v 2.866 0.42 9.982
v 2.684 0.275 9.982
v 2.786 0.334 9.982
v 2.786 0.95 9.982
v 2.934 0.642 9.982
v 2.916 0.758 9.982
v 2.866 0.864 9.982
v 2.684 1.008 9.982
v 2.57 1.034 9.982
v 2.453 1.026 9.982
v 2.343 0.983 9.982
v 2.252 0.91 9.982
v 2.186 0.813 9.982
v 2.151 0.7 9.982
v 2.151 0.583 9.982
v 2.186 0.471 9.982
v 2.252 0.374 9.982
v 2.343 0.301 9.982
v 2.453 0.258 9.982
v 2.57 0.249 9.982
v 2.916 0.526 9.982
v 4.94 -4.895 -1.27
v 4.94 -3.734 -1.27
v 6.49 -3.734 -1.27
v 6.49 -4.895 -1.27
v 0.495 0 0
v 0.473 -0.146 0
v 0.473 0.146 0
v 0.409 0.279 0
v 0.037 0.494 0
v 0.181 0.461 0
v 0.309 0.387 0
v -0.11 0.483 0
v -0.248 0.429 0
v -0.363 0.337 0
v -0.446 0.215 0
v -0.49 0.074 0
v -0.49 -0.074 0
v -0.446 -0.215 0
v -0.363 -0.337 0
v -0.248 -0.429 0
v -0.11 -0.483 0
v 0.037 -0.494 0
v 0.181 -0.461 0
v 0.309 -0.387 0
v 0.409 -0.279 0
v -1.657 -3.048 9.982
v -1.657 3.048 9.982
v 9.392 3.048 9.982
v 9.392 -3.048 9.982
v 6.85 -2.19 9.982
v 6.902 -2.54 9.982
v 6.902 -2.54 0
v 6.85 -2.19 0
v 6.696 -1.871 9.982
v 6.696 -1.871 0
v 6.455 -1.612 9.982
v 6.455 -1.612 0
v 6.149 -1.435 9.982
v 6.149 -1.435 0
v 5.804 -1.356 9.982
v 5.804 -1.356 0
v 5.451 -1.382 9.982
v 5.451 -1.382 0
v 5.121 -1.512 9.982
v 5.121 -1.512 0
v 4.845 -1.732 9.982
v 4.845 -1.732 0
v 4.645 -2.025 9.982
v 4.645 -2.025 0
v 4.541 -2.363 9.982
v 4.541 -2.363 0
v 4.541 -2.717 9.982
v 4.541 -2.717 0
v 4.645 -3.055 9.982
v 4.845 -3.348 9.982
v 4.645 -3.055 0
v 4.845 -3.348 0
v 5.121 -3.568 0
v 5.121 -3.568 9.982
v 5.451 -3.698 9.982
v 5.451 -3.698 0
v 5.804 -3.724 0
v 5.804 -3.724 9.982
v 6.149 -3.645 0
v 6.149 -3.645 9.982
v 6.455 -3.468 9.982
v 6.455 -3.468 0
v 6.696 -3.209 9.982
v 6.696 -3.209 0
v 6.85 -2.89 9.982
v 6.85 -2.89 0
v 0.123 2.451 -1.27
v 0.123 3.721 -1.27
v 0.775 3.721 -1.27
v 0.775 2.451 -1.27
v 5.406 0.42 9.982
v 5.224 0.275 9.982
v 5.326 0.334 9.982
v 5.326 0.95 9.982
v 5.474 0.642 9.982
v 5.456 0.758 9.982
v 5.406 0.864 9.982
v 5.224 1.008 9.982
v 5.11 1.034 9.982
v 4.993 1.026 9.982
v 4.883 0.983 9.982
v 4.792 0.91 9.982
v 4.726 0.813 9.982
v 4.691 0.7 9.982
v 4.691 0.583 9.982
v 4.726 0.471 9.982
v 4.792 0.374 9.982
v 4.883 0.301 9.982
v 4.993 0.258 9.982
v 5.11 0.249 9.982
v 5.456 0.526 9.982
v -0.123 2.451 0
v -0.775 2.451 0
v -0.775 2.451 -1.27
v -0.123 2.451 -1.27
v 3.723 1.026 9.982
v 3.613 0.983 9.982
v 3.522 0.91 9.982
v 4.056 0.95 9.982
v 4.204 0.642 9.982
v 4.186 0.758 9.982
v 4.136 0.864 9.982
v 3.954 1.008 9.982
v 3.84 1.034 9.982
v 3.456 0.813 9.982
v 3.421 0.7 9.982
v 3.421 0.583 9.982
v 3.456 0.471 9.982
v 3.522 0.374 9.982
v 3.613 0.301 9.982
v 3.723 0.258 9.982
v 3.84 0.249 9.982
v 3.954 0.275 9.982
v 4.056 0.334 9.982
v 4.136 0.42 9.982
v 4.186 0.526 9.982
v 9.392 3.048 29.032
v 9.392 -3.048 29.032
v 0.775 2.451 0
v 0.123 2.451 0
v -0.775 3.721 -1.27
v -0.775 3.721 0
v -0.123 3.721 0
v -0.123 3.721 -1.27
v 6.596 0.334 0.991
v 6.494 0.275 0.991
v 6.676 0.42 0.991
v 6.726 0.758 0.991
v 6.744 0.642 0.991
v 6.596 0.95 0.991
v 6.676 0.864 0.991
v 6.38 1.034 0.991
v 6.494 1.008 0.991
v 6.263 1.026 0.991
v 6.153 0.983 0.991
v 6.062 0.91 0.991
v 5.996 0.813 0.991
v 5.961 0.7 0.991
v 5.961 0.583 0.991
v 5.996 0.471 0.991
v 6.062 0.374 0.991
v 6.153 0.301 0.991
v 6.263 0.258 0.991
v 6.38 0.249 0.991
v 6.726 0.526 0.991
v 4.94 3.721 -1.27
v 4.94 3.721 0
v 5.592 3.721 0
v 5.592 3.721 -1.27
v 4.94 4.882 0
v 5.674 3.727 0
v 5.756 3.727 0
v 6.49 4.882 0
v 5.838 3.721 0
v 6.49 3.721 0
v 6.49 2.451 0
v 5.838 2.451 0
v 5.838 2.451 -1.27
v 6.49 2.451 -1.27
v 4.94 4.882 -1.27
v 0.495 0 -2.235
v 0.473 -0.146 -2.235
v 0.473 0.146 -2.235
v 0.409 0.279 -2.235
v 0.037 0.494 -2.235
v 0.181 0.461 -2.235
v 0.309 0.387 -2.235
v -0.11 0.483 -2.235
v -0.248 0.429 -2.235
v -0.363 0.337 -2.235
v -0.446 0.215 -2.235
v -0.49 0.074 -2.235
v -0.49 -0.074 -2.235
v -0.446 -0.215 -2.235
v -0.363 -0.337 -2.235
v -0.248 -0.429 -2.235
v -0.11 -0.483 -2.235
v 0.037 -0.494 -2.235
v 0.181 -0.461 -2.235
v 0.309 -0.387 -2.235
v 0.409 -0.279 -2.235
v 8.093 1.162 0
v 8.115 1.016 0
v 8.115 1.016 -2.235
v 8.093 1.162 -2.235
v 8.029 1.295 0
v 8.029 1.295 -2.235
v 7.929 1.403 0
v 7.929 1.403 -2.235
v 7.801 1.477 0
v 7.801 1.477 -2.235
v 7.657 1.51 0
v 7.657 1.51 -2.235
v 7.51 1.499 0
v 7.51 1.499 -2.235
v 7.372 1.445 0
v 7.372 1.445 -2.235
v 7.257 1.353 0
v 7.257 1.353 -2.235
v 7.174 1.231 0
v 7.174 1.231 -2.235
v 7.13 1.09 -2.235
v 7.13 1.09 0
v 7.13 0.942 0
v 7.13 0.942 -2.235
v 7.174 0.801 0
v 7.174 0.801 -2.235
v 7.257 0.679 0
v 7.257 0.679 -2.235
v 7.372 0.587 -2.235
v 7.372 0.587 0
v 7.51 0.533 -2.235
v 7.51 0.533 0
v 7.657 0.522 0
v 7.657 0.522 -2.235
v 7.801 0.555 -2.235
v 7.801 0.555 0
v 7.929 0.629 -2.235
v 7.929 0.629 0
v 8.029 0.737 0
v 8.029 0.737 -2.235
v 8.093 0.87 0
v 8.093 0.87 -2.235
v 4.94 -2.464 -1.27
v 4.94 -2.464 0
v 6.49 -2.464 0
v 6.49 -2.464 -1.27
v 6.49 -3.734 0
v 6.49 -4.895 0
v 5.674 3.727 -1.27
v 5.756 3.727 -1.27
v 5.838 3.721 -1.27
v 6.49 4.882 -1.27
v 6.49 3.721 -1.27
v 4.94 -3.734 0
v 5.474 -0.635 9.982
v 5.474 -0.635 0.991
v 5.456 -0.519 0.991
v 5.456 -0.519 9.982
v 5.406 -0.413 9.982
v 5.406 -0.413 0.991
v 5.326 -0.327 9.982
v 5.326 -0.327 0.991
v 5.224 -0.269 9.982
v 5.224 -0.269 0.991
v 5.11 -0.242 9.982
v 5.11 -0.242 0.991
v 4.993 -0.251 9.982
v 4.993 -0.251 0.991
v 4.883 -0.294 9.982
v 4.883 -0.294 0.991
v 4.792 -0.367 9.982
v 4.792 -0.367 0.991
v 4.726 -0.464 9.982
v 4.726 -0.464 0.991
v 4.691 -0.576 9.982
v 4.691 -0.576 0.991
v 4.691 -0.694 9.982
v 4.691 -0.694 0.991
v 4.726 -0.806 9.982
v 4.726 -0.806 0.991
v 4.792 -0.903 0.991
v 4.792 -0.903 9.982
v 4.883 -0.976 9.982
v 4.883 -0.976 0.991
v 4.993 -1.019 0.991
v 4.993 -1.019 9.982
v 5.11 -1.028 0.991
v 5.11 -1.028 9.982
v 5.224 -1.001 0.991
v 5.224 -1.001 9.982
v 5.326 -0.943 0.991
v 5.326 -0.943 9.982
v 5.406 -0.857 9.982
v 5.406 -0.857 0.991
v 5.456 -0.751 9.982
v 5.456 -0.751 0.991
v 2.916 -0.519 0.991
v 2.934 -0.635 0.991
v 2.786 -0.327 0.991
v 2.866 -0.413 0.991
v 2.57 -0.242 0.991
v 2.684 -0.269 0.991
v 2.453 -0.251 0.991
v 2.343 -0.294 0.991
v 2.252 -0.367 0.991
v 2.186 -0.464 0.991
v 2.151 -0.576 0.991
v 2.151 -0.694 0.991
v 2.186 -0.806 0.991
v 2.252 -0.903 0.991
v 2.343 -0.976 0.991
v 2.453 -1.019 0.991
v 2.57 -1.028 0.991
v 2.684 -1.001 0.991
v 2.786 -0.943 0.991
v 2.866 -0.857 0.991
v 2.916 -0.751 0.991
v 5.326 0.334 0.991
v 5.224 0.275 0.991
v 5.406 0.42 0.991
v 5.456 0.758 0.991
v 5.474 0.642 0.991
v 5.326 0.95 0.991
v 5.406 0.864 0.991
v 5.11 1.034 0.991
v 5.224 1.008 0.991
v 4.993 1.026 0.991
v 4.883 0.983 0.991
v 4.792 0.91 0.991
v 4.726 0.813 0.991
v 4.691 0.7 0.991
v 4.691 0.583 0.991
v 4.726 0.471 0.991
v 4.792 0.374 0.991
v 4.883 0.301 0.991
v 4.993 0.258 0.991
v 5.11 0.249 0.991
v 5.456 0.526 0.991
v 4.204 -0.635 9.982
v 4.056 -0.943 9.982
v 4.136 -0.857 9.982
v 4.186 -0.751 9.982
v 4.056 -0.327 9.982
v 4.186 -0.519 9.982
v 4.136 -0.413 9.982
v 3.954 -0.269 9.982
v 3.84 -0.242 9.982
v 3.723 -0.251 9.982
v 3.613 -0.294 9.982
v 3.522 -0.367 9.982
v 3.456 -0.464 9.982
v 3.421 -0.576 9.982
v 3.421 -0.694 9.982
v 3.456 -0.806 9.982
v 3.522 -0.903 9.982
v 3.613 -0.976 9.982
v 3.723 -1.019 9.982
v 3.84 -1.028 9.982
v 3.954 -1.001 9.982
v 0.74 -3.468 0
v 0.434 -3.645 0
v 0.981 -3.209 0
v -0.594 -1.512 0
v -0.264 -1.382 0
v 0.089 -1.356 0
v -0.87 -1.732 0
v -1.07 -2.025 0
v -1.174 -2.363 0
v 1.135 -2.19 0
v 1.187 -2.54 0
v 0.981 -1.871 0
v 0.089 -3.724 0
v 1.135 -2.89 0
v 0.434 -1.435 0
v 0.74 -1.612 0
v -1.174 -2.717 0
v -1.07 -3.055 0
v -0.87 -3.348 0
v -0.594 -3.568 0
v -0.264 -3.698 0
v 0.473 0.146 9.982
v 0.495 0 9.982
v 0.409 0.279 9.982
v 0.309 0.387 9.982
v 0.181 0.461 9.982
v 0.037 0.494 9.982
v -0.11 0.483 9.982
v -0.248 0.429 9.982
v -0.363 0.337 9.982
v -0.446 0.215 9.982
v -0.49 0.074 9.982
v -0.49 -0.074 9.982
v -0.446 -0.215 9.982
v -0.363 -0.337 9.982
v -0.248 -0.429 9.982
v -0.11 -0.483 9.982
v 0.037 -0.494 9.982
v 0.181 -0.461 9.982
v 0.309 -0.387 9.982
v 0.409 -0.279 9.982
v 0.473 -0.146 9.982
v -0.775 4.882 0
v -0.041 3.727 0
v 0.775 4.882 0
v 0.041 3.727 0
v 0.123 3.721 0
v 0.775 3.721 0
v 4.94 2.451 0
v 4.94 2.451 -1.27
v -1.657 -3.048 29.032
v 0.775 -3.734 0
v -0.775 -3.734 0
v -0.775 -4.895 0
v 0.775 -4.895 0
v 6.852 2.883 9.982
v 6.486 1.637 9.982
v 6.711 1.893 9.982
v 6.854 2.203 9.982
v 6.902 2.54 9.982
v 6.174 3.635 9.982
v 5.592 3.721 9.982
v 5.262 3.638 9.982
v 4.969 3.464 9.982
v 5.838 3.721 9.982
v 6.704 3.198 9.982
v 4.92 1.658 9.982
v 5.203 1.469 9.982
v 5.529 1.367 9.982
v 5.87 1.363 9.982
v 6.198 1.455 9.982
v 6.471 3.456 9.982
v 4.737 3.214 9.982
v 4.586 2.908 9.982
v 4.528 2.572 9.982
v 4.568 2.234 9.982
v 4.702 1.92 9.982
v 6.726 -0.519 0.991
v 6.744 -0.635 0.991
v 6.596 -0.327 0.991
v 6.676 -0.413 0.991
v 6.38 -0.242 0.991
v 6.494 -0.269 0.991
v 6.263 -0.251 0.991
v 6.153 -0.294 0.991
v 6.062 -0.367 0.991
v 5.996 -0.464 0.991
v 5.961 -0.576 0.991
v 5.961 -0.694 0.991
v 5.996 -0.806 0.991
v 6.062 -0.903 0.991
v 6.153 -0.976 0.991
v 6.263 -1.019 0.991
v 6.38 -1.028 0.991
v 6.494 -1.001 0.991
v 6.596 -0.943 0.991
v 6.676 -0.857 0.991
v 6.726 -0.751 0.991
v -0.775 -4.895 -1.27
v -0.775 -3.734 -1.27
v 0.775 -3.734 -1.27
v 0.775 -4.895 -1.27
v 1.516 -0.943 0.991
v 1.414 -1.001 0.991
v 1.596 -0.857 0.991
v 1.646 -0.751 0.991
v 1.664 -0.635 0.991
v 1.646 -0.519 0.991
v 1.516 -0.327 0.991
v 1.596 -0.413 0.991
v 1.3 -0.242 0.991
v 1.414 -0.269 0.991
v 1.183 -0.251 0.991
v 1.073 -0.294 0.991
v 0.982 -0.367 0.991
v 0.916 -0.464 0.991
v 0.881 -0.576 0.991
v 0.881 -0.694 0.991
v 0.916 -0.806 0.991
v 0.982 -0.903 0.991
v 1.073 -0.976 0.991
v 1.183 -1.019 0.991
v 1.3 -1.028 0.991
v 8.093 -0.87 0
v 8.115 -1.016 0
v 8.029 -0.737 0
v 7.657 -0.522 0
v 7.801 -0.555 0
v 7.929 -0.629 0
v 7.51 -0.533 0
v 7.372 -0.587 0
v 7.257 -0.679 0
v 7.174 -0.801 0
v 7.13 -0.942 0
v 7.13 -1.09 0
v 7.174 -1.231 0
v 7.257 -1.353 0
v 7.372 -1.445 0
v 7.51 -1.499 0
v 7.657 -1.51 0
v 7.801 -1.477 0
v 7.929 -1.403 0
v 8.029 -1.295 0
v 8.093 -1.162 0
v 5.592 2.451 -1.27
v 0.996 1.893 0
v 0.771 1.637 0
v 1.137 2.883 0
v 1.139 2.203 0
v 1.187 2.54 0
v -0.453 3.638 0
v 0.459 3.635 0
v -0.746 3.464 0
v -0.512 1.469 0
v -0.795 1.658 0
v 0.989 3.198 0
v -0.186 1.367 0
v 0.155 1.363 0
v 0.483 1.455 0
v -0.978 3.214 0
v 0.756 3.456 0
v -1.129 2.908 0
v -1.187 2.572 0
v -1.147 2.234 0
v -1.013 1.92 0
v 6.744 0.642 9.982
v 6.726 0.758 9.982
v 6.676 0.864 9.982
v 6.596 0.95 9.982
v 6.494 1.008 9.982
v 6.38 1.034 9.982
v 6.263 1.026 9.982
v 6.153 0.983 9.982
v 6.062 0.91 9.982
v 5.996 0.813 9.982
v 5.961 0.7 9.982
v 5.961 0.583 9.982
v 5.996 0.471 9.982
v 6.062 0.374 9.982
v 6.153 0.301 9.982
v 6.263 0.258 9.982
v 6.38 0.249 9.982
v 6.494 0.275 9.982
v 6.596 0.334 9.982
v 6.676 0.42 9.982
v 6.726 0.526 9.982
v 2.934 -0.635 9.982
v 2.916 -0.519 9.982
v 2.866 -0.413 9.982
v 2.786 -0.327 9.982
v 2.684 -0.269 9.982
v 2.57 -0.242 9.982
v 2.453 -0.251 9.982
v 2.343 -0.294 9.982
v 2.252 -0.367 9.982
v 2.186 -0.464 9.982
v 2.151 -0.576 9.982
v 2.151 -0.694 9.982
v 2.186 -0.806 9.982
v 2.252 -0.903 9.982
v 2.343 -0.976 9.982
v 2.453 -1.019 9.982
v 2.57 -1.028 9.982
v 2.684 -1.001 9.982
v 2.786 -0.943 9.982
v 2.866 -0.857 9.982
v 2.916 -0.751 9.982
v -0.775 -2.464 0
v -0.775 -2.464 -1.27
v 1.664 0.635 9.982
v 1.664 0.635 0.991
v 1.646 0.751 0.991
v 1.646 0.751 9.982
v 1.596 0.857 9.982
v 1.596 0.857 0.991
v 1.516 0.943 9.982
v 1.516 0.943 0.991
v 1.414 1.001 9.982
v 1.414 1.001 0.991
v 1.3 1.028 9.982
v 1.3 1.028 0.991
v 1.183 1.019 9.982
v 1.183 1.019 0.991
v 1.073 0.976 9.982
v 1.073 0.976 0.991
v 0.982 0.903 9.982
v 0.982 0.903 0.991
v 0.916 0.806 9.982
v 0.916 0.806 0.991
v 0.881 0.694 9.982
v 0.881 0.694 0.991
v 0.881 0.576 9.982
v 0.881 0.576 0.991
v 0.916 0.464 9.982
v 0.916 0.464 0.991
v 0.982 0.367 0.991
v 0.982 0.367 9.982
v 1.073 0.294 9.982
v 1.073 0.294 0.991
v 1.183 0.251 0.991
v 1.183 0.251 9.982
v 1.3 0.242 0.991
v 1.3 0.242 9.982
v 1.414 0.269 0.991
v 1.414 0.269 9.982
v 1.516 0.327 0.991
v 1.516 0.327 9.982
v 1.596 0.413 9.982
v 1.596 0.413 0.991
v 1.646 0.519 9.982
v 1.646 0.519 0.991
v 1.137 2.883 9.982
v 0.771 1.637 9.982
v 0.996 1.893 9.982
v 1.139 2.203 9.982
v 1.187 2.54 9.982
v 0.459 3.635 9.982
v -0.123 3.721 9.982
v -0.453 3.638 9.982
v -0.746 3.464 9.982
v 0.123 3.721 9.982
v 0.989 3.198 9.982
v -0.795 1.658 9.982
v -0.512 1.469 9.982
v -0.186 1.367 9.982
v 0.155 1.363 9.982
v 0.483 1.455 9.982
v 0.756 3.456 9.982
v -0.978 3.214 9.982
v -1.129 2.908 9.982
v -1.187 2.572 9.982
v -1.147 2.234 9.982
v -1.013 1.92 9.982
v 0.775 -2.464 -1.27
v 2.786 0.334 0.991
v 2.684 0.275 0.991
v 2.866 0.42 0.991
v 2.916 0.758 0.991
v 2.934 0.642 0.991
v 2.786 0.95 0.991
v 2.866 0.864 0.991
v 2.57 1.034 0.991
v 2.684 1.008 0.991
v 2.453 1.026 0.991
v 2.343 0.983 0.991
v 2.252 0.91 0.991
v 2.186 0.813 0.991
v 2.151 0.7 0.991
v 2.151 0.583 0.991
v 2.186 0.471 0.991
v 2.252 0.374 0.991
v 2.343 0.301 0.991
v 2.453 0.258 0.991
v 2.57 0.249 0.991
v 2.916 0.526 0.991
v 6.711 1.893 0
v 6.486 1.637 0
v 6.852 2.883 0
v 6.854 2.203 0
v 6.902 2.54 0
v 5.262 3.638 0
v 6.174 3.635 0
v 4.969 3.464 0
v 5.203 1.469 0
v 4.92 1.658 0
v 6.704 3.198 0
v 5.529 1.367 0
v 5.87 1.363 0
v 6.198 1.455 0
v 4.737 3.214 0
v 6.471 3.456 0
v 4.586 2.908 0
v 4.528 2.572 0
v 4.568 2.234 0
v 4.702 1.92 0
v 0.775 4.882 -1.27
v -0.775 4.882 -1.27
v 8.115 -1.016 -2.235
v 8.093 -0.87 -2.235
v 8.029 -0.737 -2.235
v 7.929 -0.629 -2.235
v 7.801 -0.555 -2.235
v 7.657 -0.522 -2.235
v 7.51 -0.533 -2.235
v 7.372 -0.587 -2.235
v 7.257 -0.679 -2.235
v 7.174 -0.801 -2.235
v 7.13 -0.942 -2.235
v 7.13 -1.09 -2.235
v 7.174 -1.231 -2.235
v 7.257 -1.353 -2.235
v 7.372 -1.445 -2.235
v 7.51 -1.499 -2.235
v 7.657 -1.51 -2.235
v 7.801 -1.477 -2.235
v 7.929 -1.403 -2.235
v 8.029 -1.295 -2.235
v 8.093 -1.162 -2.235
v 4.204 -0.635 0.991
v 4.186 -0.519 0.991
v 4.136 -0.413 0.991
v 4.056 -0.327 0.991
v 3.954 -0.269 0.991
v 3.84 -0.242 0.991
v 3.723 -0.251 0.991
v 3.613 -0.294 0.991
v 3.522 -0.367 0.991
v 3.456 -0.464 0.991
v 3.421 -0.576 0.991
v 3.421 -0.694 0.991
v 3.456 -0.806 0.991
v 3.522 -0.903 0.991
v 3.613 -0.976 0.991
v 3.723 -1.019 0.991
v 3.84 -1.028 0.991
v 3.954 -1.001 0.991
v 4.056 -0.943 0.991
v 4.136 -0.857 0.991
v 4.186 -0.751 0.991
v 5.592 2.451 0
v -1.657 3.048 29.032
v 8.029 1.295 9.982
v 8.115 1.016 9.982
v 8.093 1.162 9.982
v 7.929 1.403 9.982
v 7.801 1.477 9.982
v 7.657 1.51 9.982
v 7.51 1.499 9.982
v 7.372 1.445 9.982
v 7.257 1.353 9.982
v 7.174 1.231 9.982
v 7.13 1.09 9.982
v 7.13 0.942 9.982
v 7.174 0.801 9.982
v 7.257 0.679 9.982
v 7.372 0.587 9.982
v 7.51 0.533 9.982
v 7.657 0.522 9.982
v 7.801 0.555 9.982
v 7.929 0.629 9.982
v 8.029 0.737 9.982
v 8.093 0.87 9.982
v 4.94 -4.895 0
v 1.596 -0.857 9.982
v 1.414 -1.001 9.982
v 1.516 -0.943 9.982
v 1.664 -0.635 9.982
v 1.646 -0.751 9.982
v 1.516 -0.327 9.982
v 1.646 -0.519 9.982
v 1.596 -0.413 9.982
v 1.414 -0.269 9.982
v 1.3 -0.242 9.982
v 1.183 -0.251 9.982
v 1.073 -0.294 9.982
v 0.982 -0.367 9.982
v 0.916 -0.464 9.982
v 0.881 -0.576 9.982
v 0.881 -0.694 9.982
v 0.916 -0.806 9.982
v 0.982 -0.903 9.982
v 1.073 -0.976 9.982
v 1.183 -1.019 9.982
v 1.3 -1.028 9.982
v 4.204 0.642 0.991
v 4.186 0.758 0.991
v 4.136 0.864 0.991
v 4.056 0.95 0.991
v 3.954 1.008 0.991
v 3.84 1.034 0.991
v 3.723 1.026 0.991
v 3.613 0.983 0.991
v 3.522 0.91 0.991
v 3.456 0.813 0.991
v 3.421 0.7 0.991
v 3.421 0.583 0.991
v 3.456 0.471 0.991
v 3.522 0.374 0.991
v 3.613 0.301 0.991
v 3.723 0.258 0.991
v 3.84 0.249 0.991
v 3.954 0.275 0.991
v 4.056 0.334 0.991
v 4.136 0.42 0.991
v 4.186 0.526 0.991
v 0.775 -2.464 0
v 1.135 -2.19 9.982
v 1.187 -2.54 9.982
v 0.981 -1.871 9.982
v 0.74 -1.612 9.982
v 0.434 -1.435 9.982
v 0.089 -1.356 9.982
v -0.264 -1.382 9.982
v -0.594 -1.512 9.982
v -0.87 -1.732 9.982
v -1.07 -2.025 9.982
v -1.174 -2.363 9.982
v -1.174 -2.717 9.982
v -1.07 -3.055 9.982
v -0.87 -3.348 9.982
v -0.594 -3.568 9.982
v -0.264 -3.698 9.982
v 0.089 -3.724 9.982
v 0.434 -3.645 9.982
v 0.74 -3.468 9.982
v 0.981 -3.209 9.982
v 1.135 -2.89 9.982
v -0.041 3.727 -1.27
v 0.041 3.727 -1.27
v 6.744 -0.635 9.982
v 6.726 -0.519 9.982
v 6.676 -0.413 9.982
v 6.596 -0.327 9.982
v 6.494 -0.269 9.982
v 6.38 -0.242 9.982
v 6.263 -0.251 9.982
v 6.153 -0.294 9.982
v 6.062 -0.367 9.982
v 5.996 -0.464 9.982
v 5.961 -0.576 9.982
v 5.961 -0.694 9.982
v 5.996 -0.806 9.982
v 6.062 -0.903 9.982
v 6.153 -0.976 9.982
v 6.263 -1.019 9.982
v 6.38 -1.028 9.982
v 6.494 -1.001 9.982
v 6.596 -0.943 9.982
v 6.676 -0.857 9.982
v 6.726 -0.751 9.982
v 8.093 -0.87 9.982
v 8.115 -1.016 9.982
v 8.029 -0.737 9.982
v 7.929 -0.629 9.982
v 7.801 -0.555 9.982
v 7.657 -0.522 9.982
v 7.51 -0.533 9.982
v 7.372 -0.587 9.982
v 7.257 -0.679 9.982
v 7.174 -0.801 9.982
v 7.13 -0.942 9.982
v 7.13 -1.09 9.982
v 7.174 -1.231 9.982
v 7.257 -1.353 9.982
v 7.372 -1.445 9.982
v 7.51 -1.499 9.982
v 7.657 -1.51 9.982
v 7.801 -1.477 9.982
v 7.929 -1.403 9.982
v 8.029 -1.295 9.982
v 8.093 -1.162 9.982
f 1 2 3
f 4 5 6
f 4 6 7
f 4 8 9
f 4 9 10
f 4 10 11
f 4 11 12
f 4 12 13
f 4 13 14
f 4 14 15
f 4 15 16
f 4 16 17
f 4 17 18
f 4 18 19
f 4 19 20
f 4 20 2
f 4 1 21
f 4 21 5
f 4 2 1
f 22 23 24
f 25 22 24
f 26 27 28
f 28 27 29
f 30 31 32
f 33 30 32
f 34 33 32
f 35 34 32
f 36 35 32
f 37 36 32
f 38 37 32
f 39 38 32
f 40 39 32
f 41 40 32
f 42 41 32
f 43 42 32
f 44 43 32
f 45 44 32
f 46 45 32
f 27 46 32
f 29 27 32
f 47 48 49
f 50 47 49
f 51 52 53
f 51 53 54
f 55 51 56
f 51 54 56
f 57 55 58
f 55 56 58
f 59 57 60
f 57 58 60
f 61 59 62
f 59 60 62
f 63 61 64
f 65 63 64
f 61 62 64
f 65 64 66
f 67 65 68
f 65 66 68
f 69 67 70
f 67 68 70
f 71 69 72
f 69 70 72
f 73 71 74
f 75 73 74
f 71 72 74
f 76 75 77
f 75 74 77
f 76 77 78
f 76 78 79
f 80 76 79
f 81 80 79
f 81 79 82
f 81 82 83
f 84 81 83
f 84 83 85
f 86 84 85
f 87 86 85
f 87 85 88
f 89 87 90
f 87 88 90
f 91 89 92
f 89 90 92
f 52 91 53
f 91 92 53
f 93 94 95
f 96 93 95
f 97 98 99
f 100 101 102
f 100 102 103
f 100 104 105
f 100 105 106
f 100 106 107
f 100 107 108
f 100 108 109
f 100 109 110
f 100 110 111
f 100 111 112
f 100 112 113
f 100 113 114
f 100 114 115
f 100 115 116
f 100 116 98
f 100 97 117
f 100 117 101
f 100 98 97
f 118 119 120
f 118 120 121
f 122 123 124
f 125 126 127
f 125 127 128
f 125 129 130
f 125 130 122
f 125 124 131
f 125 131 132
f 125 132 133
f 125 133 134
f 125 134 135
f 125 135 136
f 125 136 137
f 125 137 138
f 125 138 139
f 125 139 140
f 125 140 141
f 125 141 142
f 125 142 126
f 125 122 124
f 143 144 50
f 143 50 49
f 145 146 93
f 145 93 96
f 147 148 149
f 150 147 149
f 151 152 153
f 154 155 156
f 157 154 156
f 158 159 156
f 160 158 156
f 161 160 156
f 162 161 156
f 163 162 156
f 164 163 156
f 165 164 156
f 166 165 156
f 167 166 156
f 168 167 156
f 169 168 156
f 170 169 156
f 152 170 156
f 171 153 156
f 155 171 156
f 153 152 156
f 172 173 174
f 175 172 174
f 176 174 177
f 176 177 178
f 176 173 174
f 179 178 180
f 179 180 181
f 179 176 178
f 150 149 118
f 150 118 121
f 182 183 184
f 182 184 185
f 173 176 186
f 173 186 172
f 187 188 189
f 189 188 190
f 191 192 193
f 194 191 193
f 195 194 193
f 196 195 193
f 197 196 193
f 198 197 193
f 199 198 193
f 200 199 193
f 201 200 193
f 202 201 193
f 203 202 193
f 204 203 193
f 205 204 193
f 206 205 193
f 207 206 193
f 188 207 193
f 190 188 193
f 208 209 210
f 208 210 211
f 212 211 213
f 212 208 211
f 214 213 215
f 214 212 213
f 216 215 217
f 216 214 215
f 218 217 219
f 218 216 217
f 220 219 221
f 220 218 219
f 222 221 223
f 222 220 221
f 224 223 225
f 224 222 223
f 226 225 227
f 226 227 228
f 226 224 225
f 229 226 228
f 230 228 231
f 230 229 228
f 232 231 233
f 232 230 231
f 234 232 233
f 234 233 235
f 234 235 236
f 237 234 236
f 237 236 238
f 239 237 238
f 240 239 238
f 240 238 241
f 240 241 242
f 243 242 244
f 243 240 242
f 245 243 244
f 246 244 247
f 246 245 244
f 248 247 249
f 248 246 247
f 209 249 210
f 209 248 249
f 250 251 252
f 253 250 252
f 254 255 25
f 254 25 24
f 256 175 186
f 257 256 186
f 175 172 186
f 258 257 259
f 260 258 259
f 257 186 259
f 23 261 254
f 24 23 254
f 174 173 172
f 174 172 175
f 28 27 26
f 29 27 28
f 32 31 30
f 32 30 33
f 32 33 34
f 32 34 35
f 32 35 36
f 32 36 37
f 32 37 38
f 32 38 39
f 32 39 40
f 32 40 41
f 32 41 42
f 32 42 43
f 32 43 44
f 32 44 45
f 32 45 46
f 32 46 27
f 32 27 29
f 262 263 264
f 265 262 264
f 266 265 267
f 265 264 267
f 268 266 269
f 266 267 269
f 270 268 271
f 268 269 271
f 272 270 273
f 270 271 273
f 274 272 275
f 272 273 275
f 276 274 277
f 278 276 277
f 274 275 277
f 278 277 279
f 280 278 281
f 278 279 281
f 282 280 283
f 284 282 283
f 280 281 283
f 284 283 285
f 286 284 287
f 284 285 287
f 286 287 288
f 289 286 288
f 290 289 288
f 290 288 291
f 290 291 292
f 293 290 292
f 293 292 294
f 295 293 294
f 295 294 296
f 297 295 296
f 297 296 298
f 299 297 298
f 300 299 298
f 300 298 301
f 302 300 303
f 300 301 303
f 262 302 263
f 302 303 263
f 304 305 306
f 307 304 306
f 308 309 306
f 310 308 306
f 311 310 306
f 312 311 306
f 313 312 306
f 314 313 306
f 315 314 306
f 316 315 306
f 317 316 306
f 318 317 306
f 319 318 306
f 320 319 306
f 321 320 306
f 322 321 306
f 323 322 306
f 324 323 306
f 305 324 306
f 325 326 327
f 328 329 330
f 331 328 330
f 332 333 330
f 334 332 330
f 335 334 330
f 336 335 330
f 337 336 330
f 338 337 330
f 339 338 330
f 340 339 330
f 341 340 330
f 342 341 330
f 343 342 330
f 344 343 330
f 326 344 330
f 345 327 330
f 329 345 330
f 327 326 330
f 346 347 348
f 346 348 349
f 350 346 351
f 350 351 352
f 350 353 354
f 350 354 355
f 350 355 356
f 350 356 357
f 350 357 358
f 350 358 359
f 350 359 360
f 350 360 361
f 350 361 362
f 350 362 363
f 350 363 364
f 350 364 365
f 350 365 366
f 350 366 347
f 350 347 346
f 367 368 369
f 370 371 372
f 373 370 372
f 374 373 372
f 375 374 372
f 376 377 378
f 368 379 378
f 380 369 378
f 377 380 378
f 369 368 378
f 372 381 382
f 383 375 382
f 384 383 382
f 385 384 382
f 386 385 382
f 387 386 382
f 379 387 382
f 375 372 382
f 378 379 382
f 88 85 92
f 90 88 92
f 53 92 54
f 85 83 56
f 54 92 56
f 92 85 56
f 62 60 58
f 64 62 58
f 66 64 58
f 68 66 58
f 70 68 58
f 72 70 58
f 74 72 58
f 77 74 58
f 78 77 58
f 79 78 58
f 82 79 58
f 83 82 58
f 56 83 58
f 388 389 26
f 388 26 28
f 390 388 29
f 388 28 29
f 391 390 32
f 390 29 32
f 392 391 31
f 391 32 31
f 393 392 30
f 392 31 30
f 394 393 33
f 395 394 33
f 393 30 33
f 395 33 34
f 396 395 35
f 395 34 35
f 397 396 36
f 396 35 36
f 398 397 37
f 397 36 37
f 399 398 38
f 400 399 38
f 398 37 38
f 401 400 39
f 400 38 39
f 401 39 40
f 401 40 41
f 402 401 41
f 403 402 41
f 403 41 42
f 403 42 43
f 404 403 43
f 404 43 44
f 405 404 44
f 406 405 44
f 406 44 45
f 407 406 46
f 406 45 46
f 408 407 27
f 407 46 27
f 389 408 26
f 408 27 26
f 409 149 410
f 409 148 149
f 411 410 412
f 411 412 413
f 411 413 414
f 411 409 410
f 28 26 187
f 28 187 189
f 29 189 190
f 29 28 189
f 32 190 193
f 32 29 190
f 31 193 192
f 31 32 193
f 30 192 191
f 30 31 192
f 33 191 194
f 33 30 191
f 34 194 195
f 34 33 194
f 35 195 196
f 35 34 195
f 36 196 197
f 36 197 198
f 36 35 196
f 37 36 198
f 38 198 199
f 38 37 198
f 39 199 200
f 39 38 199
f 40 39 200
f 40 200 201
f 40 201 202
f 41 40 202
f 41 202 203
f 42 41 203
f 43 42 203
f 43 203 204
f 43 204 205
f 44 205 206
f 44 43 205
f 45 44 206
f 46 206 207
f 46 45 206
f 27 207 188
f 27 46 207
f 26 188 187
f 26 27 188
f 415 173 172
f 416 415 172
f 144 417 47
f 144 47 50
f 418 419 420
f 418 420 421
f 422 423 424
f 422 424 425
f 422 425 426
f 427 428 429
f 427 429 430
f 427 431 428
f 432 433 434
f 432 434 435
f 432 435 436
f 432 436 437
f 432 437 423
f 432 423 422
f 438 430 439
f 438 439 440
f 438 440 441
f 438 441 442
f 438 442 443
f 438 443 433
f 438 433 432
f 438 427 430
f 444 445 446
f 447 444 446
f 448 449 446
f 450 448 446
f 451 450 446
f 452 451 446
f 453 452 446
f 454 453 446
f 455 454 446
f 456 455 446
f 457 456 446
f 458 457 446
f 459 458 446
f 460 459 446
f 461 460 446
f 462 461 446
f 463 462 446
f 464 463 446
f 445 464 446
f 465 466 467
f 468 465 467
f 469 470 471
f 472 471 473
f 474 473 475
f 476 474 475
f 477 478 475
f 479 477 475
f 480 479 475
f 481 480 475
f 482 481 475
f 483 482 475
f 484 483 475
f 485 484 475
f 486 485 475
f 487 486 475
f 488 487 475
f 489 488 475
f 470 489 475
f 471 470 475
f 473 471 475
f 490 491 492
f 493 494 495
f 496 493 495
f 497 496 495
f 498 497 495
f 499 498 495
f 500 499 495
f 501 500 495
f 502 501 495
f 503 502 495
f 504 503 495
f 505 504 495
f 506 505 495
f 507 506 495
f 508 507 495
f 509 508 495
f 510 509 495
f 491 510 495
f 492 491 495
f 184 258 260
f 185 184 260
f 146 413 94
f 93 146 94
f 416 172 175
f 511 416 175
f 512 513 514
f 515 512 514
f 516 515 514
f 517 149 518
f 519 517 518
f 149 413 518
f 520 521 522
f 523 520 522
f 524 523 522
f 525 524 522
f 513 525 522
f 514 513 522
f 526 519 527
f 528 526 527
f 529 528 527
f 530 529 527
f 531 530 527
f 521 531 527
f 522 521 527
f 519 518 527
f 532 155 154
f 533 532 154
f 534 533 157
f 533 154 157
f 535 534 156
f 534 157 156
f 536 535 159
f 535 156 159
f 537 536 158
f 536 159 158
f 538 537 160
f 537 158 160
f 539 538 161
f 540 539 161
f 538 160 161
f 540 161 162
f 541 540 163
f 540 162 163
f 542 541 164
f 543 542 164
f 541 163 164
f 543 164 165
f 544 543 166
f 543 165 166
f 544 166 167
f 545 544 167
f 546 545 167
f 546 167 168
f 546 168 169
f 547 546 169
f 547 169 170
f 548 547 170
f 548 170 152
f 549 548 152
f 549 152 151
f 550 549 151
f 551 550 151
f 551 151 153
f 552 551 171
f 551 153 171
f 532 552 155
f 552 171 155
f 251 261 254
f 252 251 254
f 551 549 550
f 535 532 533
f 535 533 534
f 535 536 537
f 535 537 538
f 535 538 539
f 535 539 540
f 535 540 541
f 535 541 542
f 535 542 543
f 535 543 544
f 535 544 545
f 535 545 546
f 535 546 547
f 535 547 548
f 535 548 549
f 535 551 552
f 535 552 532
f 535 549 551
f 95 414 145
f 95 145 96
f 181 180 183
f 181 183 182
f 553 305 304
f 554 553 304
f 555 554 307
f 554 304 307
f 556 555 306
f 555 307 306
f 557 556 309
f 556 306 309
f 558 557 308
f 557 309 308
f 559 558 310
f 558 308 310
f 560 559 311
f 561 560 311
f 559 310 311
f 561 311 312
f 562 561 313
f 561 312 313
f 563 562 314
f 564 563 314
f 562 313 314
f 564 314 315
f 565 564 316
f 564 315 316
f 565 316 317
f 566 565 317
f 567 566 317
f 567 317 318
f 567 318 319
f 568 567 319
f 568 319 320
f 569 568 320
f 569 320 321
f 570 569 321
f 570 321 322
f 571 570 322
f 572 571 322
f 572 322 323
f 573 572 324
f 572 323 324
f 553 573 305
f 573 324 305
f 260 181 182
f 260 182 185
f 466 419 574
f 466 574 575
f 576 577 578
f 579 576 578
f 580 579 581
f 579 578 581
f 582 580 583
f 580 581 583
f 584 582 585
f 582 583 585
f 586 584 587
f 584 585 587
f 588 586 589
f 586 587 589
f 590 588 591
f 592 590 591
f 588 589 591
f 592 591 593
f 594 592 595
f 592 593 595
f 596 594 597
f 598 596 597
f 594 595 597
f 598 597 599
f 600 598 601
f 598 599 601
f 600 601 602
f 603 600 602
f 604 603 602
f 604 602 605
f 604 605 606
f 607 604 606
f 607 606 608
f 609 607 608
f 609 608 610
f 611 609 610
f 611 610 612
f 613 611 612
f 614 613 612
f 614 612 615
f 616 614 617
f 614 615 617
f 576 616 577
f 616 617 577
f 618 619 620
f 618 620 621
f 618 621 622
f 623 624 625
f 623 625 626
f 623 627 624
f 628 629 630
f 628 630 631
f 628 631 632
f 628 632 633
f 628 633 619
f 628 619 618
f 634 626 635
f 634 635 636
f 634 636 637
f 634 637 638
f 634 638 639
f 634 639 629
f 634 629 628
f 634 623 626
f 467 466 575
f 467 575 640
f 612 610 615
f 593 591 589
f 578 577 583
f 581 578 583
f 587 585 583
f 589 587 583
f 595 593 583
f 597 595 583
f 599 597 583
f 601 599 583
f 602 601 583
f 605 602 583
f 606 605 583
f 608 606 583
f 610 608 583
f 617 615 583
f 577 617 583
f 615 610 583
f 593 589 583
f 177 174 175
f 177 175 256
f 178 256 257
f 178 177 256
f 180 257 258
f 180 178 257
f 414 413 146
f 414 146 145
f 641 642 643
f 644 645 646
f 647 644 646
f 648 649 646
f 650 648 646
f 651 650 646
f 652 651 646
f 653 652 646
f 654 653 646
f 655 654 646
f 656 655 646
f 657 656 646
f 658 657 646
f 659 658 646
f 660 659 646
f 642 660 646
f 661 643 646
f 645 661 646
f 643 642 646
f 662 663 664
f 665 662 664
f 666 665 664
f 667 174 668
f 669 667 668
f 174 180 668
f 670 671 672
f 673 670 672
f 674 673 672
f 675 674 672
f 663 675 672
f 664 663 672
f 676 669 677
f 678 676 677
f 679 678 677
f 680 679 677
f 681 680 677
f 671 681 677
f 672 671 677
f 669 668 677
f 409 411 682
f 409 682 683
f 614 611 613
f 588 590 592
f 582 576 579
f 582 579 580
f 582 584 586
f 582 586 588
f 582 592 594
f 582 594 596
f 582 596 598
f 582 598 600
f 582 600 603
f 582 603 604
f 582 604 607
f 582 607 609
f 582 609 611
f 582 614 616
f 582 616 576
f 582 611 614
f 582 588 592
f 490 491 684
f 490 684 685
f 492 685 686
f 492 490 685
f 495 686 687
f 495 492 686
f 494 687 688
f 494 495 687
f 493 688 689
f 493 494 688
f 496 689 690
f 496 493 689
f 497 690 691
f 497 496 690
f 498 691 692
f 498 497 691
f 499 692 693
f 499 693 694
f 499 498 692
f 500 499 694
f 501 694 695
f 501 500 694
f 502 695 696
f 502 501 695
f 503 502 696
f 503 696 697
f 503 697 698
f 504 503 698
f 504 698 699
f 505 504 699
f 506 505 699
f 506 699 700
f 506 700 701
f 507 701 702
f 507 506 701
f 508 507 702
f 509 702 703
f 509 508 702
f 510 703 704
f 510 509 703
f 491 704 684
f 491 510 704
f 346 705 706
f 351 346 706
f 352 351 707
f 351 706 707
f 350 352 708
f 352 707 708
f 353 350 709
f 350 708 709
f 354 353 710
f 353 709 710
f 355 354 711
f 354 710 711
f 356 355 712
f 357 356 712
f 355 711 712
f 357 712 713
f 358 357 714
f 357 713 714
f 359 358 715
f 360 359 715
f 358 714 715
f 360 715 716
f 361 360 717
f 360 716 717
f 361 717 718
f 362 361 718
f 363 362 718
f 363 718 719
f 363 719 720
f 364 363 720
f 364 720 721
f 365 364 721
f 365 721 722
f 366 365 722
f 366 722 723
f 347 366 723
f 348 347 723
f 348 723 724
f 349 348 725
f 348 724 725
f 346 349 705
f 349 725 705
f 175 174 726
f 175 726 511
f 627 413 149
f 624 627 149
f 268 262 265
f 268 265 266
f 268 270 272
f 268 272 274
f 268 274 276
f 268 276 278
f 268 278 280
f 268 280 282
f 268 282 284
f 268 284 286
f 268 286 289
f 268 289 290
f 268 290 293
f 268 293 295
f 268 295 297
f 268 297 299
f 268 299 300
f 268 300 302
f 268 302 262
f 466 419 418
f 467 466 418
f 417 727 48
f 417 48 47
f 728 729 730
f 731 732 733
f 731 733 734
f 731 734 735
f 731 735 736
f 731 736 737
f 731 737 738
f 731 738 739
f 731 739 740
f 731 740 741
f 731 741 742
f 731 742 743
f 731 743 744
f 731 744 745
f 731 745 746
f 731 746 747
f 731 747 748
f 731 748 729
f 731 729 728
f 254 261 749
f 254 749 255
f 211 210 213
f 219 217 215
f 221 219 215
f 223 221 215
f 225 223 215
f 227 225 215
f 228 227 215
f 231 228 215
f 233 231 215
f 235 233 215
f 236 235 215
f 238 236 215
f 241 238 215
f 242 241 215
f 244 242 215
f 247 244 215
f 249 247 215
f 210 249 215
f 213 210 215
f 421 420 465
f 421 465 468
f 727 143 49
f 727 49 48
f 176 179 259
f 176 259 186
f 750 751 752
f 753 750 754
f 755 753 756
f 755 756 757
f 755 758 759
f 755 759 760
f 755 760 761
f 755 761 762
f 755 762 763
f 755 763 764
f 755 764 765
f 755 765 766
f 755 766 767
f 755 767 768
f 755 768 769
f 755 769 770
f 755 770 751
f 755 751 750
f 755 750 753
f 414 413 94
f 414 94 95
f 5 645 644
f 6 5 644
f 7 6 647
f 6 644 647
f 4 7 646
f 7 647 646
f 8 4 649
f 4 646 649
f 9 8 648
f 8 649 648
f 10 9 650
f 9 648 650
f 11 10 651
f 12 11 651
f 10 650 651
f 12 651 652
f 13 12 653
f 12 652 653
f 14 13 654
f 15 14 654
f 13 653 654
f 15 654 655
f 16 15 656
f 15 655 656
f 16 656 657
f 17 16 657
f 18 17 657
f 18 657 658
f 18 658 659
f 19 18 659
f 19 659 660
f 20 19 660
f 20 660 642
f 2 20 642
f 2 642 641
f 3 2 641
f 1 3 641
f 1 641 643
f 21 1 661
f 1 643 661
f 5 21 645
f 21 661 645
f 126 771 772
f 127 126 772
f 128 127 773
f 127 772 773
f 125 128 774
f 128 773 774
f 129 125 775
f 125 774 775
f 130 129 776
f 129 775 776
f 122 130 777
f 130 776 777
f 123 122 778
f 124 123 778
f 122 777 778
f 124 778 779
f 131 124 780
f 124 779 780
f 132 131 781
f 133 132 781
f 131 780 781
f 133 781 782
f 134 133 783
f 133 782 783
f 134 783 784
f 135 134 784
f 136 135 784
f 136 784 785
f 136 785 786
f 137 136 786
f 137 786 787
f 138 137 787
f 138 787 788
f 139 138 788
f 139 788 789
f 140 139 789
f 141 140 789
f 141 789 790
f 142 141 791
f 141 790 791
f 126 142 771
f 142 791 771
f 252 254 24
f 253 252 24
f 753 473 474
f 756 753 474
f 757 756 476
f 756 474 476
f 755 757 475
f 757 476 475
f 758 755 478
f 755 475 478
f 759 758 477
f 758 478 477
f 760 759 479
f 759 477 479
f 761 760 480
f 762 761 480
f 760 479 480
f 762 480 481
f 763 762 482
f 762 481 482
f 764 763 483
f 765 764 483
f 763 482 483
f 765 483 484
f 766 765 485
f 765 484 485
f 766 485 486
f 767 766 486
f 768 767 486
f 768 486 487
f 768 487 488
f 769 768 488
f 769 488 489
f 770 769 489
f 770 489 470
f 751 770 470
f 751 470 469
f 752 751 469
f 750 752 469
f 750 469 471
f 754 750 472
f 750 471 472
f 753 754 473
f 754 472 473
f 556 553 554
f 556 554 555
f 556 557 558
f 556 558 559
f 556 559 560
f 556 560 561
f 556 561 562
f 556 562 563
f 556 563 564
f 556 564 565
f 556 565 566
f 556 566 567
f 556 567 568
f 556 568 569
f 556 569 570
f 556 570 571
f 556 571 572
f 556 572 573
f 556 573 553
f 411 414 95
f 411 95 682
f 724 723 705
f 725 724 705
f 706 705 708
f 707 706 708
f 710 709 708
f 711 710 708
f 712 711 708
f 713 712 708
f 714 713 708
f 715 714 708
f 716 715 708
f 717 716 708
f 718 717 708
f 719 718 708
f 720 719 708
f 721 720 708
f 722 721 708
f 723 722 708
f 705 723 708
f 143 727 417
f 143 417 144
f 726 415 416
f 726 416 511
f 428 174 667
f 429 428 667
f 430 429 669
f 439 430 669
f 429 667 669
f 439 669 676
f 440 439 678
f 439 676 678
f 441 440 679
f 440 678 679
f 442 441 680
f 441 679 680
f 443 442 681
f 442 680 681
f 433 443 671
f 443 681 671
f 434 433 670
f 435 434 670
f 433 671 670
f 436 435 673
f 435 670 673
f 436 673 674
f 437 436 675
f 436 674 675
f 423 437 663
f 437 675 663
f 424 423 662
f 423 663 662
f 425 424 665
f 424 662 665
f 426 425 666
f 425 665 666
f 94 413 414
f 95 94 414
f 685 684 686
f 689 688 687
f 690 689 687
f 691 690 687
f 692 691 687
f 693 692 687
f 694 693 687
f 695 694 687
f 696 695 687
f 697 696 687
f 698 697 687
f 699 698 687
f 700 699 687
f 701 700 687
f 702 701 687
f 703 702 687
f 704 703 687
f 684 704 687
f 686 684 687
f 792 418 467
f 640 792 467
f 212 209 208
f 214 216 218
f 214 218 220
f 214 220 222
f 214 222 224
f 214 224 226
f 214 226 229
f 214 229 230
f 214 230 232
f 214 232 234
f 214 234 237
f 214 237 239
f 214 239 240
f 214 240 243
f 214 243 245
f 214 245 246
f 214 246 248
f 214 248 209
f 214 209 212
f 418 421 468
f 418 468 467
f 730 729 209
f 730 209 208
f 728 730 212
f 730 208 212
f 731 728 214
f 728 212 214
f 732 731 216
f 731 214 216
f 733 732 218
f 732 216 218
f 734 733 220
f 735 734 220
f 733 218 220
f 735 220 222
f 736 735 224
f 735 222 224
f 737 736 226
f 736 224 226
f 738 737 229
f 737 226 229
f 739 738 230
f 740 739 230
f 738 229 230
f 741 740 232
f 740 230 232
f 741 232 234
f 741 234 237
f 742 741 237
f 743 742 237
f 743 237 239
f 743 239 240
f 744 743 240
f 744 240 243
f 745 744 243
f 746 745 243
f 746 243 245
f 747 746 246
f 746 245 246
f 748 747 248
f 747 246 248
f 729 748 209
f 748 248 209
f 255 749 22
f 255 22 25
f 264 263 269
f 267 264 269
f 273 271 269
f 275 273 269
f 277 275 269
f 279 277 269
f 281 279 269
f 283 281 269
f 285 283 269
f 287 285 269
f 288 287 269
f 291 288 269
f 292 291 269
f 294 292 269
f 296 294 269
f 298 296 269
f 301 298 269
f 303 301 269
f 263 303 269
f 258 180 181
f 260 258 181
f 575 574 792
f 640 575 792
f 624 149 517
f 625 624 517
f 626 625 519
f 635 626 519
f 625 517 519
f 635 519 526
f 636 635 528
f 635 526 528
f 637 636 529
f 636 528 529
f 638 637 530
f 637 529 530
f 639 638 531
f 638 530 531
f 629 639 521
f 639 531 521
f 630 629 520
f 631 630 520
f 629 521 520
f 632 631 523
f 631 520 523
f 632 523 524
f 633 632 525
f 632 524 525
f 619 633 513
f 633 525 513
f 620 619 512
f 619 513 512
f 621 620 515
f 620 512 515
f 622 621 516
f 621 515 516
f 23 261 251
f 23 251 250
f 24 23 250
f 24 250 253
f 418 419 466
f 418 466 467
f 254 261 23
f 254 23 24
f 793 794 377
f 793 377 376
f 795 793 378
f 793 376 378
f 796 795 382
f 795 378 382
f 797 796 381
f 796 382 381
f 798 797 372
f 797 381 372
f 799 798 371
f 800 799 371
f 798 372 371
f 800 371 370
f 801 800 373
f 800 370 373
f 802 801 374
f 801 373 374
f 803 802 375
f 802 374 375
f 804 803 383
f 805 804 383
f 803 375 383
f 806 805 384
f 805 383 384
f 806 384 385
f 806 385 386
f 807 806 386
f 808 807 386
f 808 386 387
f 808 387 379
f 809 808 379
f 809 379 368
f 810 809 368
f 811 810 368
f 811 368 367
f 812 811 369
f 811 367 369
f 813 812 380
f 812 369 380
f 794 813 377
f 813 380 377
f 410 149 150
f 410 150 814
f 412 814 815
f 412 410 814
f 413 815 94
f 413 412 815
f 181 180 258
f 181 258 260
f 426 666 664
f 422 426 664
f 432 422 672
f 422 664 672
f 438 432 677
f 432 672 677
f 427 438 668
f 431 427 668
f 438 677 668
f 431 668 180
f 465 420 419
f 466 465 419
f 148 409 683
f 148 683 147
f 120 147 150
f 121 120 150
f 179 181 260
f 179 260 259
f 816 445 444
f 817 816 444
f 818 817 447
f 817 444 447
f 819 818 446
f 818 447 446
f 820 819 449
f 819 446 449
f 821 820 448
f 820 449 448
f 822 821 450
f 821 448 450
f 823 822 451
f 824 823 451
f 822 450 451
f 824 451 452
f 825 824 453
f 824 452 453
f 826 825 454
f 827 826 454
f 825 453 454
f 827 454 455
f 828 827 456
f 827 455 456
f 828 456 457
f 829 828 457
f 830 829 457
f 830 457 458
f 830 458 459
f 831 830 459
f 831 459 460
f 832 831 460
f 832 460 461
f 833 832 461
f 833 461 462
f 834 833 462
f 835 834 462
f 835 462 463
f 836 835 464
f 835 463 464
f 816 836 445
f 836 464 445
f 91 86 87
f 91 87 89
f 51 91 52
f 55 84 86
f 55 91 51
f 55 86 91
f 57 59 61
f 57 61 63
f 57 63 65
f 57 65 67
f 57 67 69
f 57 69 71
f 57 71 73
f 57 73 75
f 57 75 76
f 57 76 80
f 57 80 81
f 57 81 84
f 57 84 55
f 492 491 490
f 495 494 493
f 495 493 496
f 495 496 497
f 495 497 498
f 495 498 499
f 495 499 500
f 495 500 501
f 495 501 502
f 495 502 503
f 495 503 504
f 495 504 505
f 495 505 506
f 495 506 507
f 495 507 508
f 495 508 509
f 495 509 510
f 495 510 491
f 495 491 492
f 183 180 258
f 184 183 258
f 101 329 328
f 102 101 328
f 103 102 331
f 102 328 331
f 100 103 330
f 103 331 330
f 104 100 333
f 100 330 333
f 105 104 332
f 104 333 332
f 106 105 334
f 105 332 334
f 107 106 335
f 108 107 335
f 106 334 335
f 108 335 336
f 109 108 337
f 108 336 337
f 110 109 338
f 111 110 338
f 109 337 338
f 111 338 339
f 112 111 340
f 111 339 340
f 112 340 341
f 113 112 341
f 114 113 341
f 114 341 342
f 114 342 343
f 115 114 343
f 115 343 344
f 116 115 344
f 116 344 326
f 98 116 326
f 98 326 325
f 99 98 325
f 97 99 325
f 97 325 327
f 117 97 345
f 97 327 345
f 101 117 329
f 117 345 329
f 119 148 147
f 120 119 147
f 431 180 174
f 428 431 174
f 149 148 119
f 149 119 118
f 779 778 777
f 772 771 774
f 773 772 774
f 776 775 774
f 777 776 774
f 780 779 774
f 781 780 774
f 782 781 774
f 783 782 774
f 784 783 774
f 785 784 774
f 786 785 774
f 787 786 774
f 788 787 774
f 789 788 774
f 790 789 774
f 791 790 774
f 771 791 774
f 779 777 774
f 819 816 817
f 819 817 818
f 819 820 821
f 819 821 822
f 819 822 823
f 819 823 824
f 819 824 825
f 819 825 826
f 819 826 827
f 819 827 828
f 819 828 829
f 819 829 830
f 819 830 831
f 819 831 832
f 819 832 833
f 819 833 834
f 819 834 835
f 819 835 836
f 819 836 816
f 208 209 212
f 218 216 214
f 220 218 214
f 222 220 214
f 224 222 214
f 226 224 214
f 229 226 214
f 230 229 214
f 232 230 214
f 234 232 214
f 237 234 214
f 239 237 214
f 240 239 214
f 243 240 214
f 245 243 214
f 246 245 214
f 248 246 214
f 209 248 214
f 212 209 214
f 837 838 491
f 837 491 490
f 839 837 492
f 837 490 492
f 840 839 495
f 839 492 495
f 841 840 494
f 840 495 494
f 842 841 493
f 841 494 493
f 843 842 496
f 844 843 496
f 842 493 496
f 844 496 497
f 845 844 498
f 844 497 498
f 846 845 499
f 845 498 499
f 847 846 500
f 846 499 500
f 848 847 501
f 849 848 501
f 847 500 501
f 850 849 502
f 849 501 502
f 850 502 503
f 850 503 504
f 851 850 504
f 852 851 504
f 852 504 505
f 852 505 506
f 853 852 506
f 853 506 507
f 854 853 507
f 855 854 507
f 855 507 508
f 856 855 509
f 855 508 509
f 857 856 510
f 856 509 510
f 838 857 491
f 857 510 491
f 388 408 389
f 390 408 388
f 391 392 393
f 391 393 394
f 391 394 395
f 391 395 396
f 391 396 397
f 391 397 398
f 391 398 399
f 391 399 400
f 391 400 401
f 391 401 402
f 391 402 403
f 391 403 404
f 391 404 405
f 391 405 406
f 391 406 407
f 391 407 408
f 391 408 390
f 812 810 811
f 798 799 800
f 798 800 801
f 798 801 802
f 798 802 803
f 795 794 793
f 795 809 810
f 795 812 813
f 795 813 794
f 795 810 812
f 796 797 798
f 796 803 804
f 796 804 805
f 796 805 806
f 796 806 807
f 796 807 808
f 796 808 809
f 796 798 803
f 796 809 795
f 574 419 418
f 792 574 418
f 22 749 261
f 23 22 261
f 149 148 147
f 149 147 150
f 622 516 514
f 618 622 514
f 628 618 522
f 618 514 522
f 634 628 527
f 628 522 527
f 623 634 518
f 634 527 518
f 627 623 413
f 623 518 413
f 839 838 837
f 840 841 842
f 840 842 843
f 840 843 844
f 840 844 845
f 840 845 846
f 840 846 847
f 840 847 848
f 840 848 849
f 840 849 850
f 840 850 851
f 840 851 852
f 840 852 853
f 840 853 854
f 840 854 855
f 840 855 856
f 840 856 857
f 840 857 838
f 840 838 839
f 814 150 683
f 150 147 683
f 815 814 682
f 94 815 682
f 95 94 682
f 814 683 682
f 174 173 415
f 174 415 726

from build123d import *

# Parameters (mm, degrees)
F1_DEPTH = 1.27
F0_W     = 1.5494
F0_H     = 1.161047956
F0_R     = 0.4953
F2_DEPTH = 2.2352
F0_R_2   = 1.18745
F3_DEPTH = 9.9822
F4_DEPTH = 1.27
F5_DEPTH = 1.27
F6_START = 0.9906
F0_R_3   = 0.3937
F6_DEPTH = 8.9916
F8_DEPTH = 19.05
F9_DEPTH = 9.9822


with BuildPart() as f1:
    # F0 (on Top) → F1 (new body)
    with BuildSketch(Plane.XY):
        with BuildLine():
            ThreePointArc((-0.1226388703, 3.7211), (0, 3.72745), (0.1226388703, 3.7211))
            Line((0.1226388703, 3.7211), (0.7747, 3.7211))
            Line((0.7747, 3.7211), (0.7747, 4.882147956))
            Line((0.7747, 4.882147956), (-0.7747, 4.882147956))
            Line((-0.7747, 4.882147956), (-0.7747, 3.7211))
            Line((-0.7747, 3.7211), (-0.1226388703, 3.7211))
        make_face()
    extrude(amount=-F1_DEPTH)


with BuildPart() as f1b:
    # F0 (on Top) → F1, piece 2 (new body)
    with BuildSketch(Plane.XY):
        with BuildLine():
            ThreePointArc((5.5923611297, 3.7211), (5.715, 3.72745), (5.8376388703, 3.7211))
            Line((5.8376388703, 3.7211), (6.4897, 3.7211))
            Line((6.4897, 3.7211), (6.4897, 4.882147956))
            Line((6.4897, 4.882147956), (4.9403, 4.882147956))
            Line((4.9403, 4.882147956), (4.9403, 3.7211))
            Line((4.9403, 3.7211), (5.5923611297, 3.7211))
        make_face()
    extrude(amount=-F1_DEPTH)


with BuildPart() as f1c:
    # F0 (on Top) → F1, piece 3 (new body)
    with BuildSketch(Plane.XY):
        with Locations((0, -4.3142373906)):
            Rectangle(F0_W, F0_H)
    extrude(amount=-F1_DEPTH)


with BuildPart() as f1d:
    # F0 (on Top) → F1, piece 4 (new body)
    with BuildSketch(Plane.XY):
        with Locations((5.715, -4.3142373906)):
            Rectangle(F0_W, F0_H)
    extrude(amount=-F1_DEPTH)


with BuildPart() as f2:
    # F0 (on Top) → F2 (new body)
    with BuildSketch(Plane.XY):
        with Locations((7.62, -1.016)):
            Circle(F0_R)
    extrude(amount=-F2_DEPTH)


with BuildPart() as f2b:
    # F0 (on Top) → F2, piece 2 (new body)
    with BuildSketch(Plane.XY):
        with Locations((7.62, 1.016)):
            Circle(F0_R)
    extrude(amount=-F2_DEPTH)


with BuildPart() as f2c:
    # F0 (on Top) → F2, piece 3 (new body)
    with BuildSketch(Plane.XY):
        Circle(F0_R)
    extrude(amount=-F2_DEPTH)


with BuildPart() as f3:
    # F0 (on Top) → F3 (new body)
    with BuildSketch(Plane.XY):
        with Locations((0, -2.54)):
            Circle(F0_R_2)
        with Locations((5.715, -2.54)):
            Circle(F0_R_2)
        with BuildLine():
            ThreePointArc((5.5923611297, 3.7211), (4.9198868081, 1.6580518641), (6.90245, 2.54))
            ThreePointArc((6.90245, 2.54), (6.5969481359, 3.3351131919), (5.8376388703, 3.7211))
            Line((5.8376388703, 3.7211), (5.5923611297, 3.7211))
        make_face()
        with BuildLine():
            ThreePointArc((-0.1226388703, 3.7211), (-0.7951131919, 1.6580518641), (1.18745, 2.54))
            ThreePointArc((1.18745, 2.54), (0.8819481359, 3.3351131919), (0.1226388703, 3.7211))
            Line((0.1226388703, 3.7211), (-0.1226388703, 3.7211))
        make_face()
    extrude(amount=F3_DEPTH)


with BuildPart() as f4:
    # F4 (new): a face of the model
    f4_faces = [f1.part.faces().sort_by_distance(p)[0] for p in [
        (0.4486694351, 3.7211, -0.635),
    ]]
    extrude(f4_faces, amount=F4_DEPTH)


with BuildPart() as f4b:
    # F4#2 (new): a face of the model
    f4_2_faces = [f1.part.faces().sort_by_distance(p)[0] for p in [
        (-0.4486694351, 3.7211, -0.635),
    ]]
    extrude(f4_2_faces, amount=F4_DEPTH)


with BuildPart() as f4c:
    # F4#3 (new): a face of the model
    f4_3_faces = [f1b.part.faces().sort_by_distance(p)[0] for p in [
        (5.2663305649, 3.7211, -0.635),
    ]]
    extrude(f4_3_faces, amount=F4_DEPTH)


with BuildPart() as f4d:
    # F4#4 (new): a face of the model
    f4_4_faces = [f1b.part.faces().sort_by_distance(p)[0] for p in [
        (6.1636694351, 3.7211, -0.635),
    ]]
    extrude(f4_4_faces, amount=F4_DEPTH)


with BuildPart() as f5:
    # F5 (new): a face of the model
    f5_faces = [f1c.part.faces().sort_by_distance(p)[0] for p in [
        (0, -3.7337134127, -0.635),
    ]]
    extrude(f5_faces, amount=F5_DEPTH)


with BuildPart() as f5b:
    # F5#2 (new): a face of the model
    f5_2_faces = [f1d.part.faces().sort_by_distance(p)[0] for p in [
        (5.715, -3.7337134127, -0.635),
    ]]
    extrude(f5_2_faces, amount=F5_DEPTH)


with BuildPart() as f6:
    # F0 (on Top) → F6 (new body)
    with BuildSketch(Plane.XY.offset(F6_START)):
        with Locations((3.8102645494, -0.635)):
            Circle(F0_R_3)
    extrude(amount=F6_DEPTH)


with BuildPart() as f6b:
    # F0 (on Top) → F6, piece 2 (new body)
    with BuildSketch(Plane.XY.offset(F6_START)):
        with Locations((3.8102645494, 0.6417604301)):
            Circle(F0_R_3)
    extrude(amount=F6_DEPTH)


with BuildPart() as f6c:
    # F0 (on Top) → F6, piece 3 (new body)
    with BuildSketch(Plane.XY.offset(F6_START)):
        with Locations((2.5402645494, 0.6417604301)):
            Circle(F0_R_3)
    extrude(amount=F6_DEPTH)


with BuildPart() as f6d:
    # F0 (on Top) → F6, piece 4 (new body)
    with BuildSketch(Plane.XY.offset(F6_START)):
        with Locations((2.5402645494, -0.635)):
            Circle(F0_R_3)
    extrude(amount=F6_DEPTH)


with BuildPart() as f6e:
    # F0 (on Top) → F6, piece 5 (new body)
    with BuildSketch(Plane.XY.offset(F6_START)):
        with Locations((1.2702645494, -0.635)):
            Circle(F0_R_3)
    extrude(amount=F6_DEPTH)


with BuildPart() as f6f:
    # F0 (on Top) → F6, piece 6 (new body)
    with BuildSketch(Plane.XY.offset(F6_START)):
        with Locations((1.2702645494, 0.635)):
            Circle(F0_R_3)
    extrude(amount=F6_DEPTH)


with BuildPart() as f6g:
    # F0 (on Top) → F6, piece 7 (new body)
    with BuildSketch(Plane.XY.offset(F6_START)):
        with Locations((5.0802645494, -0.635)):
            Circle(F0_R_3)
    extrude(amount=F6_DEPTH)


with BuildPart() as f6h:
    # F0 (on Top) → F6, piece 8 (new body)
    with BuildSketch(Plane.XY.offset(F6_START)):
        with Locations((5.0802645494, 0.6417604301)):
            Circle(F0_R_3)
    extrude(amount=F6_DEPTH)


with BuildPart() as f6i:
    # F0 (on Top) → F6, piece 9 (new body)
    with BuildSketch(Plane.XY.offset(F6_START)):
        with Locations((6.3502645494, 0.6417604301)):
            Circle(F0_R_3)
    extrude(amount=F6_DEPTH)


with BuildPart() as f6j:
    # F0 (on Top) → F6, piece 10 (new body)
    with BuildSketch(Plane.XY.offset(F6_START)):
        with Locations((6.3502645494, -0.635)):
            Circle(F0_R_3)
    extrude(amount=F6_DEPTH)


with BuildPart() as f8:
    # F7 (on face) → F8 (new body)
    with BuildSketch(Plane.XY.offset(9.9822)):
        with BuildLine():
            Line((9.39165, -3.048), (9.39165, 3.048))
            Line((9.39165, 3.048), (1.0733002853, 3.048))
            ThreePointArc((1.0733002853, 3.048), (0, 1.35255), (-1.0733002853, 3.048))
            Line((-1.0733002853, 3.048), (-1.65735, 3.048))
            Line((-1.65735, 3.048), (-1.65735, -3.048))
            Line((-1.65735, -3.048), (9.39165, -3.048))
        make_face()
        with BuildLine():
            ThreePointArc((-1.0733002853, 3.048), (0, 1.35255), (1.0733002853, 3.048))
            Line((1.0733002853, 3.048), (-1.0733002853, 3.048))
        make_face()
    extrude(amount=F8_DEPTH)


with BuildPart() as f9:
    # F0 (on Top) → F9 (new body)
    with BuildSketch(Plane.XY):
        with Locations((7.62, 1.016)):
            Circle(F0_R)
    extrude(amount=F9_DEPTH)


with BuildPart() as f9b:
    # F0 (on Top) → F9, piece 2 (new body)
    with BuildSketch(Plane.XY):
        with Locations((7.62, -1.016)):
            Circle(F0_R)
    extrude(amount=F9_DEPTH)


with BuildPart() as f9c:
    # F0 (on Top) → F9, piece 3 (new body)
    with BuildSketch(Plane.XY):
        Circle(F0_R)
    extrude(amount=F9_DEPTH)


solid = Compound([f1.part, f1b.part, f1c.part, f1d.part, f2.part, f2b.part, f2c.part, f3.part, f4.part, f4b.part, f4c.part, f4d.part, f5.part, f5b.part, f6.part, f6b.part, f6c.part, f6d.part, f6e.part, f6f.part, f6g.part, f6h.part, f6i.part, f6j.part, f8.part, f9.part, f9b.part, f9c.part])
